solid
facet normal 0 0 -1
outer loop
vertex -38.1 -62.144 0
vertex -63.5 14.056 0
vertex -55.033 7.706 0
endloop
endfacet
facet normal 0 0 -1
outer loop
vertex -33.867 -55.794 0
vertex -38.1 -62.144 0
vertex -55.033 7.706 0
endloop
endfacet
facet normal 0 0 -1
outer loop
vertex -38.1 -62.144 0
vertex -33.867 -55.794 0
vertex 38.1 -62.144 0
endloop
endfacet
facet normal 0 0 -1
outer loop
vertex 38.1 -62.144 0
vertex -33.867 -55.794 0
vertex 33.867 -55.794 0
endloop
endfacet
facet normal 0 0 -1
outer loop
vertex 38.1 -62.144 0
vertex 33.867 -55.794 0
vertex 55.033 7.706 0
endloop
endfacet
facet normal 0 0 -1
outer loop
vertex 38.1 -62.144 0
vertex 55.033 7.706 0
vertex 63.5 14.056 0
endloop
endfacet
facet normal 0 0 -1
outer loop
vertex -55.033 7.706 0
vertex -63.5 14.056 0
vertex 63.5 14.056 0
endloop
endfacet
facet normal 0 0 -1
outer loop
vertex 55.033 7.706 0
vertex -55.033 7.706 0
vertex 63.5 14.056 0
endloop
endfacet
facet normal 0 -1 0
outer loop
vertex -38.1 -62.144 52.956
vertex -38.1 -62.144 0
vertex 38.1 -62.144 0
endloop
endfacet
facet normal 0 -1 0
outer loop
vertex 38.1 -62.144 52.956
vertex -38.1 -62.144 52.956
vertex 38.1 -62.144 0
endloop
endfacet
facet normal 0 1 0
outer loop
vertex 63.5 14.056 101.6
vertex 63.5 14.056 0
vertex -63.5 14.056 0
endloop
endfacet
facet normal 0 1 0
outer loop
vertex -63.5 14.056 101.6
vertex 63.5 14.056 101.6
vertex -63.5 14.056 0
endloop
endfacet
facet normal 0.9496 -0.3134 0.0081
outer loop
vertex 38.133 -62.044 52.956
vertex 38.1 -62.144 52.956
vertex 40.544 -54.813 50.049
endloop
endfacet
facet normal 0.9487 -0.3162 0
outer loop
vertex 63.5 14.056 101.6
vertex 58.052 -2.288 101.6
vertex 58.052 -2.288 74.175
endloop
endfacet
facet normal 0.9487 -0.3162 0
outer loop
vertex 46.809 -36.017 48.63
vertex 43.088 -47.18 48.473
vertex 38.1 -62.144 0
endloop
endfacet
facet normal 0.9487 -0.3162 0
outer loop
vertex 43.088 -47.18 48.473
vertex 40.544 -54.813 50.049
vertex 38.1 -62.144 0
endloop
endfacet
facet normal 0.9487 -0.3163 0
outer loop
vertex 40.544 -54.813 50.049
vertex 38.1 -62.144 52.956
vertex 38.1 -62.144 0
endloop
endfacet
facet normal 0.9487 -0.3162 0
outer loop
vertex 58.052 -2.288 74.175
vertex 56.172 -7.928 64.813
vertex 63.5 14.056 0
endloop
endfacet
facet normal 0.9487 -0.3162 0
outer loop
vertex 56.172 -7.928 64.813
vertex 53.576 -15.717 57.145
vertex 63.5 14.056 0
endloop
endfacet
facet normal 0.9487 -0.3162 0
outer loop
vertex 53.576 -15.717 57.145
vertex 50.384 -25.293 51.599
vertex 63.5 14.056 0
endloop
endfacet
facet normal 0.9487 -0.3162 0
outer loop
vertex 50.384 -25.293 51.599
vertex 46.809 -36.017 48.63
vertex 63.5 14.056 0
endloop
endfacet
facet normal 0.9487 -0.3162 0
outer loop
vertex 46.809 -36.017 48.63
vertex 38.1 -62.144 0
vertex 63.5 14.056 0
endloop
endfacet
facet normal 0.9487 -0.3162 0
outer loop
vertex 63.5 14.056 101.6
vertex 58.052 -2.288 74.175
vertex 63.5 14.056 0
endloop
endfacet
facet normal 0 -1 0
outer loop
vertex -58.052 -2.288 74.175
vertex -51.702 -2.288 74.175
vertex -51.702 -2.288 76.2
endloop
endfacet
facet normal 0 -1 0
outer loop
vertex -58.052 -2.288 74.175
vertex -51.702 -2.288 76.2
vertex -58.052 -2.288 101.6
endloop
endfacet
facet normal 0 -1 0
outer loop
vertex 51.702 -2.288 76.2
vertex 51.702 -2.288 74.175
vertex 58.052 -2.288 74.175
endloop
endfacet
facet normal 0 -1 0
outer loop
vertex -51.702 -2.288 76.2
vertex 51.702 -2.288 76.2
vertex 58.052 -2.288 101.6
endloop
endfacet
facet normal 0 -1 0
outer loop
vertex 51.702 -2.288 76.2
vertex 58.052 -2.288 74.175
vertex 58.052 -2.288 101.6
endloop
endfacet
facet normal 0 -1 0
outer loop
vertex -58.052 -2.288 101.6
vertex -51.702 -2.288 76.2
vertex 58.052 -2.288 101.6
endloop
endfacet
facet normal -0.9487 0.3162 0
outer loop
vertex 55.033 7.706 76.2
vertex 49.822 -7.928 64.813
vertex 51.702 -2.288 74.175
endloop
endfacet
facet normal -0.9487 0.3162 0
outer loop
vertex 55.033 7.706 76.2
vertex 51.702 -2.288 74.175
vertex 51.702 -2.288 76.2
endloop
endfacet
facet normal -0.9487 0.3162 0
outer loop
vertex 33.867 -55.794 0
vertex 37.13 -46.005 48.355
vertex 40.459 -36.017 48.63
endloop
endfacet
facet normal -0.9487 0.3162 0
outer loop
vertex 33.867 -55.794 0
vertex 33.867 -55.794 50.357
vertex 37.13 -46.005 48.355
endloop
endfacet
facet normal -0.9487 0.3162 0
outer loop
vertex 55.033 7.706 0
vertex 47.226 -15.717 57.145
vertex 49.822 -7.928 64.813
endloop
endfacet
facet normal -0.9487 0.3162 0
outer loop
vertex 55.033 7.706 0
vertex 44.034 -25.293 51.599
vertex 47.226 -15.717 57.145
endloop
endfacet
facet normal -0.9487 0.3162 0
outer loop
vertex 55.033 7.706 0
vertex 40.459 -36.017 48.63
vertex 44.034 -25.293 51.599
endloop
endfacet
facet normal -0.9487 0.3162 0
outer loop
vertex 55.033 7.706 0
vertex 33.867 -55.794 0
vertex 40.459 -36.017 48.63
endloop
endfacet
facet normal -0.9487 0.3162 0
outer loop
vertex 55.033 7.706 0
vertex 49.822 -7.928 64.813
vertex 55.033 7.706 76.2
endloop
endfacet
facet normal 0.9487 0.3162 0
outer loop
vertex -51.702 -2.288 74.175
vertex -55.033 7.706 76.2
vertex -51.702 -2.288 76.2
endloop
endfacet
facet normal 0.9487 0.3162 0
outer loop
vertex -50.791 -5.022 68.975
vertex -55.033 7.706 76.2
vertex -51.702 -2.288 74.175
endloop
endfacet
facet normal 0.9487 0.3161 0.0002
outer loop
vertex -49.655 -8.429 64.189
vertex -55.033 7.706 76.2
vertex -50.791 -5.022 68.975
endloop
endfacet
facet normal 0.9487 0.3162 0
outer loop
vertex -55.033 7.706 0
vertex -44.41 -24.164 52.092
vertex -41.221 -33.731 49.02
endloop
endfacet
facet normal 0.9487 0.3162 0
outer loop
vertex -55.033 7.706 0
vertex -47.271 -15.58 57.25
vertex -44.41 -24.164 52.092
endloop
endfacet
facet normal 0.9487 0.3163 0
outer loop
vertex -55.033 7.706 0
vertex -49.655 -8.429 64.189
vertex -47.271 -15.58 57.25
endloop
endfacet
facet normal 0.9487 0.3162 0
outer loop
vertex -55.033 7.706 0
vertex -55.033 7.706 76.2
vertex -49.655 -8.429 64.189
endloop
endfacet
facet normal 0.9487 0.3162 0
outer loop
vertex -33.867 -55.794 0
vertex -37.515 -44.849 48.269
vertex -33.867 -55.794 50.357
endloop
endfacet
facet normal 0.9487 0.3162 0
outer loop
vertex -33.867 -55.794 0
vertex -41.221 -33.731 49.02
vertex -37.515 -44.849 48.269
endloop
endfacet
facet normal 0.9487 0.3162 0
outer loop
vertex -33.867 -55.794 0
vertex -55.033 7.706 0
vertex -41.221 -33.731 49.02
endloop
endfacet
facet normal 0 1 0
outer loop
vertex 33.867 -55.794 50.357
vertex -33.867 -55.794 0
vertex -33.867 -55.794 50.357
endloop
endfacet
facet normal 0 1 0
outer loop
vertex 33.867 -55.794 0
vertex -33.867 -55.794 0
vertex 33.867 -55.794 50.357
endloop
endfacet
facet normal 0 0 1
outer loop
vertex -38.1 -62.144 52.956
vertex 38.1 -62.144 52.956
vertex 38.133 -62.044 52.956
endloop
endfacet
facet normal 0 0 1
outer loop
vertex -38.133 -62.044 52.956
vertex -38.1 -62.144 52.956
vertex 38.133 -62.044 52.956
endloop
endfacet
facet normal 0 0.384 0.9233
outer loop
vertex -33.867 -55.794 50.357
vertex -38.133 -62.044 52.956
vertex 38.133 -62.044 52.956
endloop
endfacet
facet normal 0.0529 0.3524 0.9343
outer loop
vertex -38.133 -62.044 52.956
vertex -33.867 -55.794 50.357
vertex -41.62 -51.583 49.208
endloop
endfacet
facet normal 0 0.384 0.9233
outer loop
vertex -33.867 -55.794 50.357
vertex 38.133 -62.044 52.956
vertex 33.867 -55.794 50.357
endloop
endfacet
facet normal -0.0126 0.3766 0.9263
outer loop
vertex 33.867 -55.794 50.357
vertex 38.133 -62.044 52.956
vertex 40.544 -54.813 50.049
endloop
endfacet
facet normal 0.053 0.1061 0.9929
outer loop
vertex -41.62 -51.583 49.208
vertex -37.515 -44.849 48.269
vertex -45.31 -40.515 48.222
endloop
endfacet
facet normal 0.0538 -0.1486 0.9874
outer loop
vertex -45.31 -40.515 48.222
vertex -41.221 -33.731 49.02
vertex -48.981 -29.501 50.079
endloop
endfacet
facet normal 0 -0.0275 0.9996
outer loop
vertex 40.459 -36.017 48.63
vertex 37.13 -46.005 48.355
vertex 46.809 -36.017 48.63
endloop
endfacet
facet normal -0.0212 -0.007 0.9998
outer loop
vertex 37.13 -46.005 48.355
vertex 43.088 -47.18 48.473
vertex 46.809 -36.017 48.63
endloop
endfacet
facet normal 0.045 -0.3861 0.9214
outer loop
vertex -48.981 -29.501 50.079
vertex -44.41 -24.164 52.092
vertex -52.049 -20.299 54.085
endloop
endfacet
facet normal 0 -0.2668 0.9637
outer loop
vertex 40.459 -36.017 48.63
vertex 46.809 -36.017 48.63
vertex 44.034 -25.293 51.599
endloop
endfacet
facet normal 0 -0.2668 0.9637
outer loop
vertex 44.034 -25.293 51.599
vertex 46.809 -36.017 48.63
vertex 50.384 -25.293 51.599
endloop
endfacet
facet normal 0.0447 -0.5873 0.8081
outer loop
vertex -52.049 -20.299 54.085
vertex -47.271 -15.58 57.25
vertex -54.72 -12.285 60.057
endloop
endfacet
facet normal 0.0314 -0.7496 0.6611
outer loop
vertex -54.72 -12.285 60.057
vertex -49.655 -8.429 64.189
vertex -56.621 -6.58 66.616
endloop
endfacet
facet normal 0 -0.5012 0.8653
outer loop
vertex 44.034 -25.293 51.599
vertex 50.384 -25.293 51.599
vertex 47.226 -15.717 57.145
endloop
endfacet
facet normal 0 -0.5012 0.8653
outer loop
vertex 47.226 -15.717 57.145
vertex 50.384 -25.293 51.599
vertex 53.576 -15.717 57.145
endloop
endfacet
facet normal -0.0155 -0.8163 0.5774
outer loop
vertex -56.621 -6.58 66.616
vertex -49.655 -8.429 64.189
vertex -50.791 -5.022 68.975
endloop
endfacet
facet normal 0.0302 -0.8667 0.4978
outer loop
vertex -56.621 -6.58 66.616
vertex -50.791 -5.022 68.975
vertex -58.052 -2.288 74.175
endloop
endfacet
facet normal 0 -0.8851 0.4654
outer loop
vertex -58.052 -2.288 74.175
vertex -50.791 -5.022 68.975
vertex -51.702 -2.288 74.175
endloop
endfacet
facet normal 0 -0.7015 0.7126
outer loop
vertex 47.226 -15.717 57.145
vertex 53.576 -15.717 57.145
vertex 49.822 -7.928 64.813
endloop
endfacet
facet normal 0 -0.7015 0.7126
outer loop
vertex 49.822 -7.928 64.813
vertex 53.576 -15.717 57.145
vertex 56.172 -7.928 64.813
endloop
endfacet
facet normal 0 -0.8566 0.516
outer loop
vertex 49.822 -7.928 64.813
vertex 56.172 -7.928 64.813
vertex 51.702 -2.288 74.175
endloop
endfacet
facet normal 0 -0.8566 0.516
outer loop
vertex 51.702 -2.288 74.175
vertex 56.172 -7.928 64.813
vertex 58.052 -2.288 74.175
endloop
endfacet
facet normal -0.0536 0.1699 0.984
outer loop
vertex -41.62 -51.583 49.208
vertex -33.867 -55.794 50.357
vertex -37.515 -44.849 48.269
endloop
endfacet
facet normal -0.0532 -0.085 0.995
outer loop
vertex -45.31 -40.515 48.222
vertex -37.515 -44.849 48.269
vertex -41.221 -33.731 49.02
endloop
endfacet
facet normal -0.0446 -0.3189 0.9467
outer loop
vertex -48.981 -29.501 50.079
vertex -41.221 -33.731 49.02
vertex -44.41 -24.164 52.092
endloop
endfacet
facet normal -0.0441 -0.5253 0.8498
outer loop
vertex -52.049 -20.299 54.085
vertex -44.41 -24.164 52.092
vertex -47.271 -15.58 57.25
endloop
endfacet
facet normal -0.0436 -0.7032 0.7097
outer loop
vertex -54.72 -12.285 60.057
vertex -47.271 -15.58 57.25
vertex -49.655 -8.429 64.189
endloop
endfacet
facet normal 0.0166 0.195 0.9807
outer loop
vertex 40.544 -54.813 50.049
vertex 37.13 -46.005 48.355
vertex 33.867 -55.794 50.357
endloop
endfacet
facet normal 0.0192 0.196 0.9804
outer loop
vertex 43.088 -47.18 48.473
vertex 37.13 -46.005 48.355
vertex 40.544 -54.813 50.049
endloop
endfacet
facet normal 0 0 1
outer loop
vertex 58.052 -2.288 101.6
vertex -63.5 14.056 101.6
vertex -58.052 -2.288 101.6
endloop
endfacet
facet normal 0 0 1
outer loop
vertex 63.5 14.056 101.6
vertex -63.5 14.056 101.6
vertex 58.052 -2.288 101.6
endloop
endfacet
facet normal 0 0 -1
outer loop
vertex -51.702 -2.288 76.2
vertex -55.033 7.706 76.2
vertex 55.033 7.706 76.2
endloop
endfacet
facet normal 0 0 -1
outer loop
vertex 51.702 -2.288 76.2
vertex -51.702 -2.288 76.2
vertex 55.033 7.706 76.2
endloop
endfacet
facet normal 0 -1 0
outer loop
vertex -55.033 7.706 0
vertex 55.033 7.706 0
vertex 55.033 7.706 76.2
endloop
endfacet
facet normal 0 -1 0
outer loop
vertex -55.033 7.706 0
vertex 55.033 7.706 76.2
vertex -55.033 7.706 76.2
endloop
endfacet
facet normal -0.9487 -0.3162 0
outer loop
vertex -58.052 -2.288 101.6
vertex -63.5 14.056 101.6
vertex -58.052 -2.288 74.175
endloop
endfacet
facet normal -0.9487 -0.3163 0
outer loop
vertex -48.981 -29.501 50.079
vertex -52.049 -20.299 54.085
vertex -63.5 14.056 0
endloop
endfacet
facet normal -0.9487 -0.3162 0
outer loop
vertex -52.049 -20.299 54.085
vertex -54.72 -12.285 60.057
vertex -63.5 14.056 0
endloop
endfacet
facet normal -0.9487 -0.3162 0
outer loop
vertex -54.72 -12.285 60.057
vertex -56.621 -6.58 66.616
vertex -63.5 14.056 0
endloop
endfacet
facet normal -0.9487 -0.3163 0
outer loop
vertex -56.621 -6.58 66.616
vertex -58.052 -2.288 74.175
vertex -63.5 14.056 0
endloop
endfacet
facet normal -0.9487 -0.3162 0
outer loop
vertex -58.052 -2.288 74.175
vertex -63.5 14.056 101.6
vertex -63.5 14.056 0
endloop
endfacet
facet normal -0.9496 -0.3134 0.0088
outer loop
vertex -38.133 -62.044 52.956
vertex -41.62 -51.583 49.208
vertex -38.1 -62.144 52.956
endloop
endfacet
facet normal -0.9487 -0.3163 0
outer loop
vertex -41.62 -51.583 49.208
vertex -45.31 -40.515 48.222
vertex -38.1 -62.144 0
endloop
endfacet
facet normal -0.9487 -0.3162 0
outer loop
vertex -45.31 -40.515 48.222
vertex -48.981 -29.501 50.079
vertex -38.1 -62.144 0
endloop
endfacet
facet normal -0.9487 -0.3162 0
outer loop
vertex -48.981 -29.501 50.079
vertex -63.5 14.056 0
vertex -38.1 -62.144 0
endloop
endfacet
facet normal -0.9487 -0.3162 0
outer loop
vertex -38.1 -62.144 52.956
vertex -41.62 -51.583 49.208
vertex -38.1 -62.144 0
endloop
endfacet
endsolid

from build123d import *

# Parameters (mm, degrees)
F1_DEPTH = 101.6
F4_DEPTH = 127
F6_DEPTH = 76.2


with BuildPart() as f1:
    # F0 (on Top) → F1 (new body)
    with BuildSketch(Plane.XY):
        Polygon((-63.5, 14.05588), (-38.1, -62.14412), (38.1, -62.14412), (63.5, 14.05588), align=None)
    extrude(amount=F1_DEPTH)

    # F3 (on offset) → F4 (cut)
    with BuildSketch(Plane.YZ.offset(63.5)):
        with BuildLine():
            Line((-2.288038, 110.407464), (-33.979441, 110.407464))
            ThreePointArc((-33.979441, 110.407464), (-46.417855, 109.443983), (-57.741659, 104.208156))
            Line((-57.741659, 104.208156), (-68.357266, 104.208156))
            Line((-68.357266, 104.208156), (-68.357266, 91.704749))
            Line((-68.357266, 91.704749), (-68.357266, 52.956361))
            Line((-68.357266, 52.956361), (-62.043723, 52.956361))
            ThreePointArc((-62.043723, 52.956361), (-27.599395, 50.705769), (-2.288038, 74.175155))
            Line((-2.288038, 74.175155), (-2.288038, 110.407464))
        make_face()
    extrude(amount=-F4_DEPTH, mode=Mode.SUBTRACT)

    # F5 (on Top) → F6 (cut)
    with BuildSketch(Plane.XY):
        Polygon((55.033333, 7.70588), (-55.033333, 7.70588), (-33.866667, -55.79412), (33.866667, -55.79412), align=None)
    extrude(amount=F6_DEPTH, mode=Mode.SUBTRACT)


solid = f1.part
